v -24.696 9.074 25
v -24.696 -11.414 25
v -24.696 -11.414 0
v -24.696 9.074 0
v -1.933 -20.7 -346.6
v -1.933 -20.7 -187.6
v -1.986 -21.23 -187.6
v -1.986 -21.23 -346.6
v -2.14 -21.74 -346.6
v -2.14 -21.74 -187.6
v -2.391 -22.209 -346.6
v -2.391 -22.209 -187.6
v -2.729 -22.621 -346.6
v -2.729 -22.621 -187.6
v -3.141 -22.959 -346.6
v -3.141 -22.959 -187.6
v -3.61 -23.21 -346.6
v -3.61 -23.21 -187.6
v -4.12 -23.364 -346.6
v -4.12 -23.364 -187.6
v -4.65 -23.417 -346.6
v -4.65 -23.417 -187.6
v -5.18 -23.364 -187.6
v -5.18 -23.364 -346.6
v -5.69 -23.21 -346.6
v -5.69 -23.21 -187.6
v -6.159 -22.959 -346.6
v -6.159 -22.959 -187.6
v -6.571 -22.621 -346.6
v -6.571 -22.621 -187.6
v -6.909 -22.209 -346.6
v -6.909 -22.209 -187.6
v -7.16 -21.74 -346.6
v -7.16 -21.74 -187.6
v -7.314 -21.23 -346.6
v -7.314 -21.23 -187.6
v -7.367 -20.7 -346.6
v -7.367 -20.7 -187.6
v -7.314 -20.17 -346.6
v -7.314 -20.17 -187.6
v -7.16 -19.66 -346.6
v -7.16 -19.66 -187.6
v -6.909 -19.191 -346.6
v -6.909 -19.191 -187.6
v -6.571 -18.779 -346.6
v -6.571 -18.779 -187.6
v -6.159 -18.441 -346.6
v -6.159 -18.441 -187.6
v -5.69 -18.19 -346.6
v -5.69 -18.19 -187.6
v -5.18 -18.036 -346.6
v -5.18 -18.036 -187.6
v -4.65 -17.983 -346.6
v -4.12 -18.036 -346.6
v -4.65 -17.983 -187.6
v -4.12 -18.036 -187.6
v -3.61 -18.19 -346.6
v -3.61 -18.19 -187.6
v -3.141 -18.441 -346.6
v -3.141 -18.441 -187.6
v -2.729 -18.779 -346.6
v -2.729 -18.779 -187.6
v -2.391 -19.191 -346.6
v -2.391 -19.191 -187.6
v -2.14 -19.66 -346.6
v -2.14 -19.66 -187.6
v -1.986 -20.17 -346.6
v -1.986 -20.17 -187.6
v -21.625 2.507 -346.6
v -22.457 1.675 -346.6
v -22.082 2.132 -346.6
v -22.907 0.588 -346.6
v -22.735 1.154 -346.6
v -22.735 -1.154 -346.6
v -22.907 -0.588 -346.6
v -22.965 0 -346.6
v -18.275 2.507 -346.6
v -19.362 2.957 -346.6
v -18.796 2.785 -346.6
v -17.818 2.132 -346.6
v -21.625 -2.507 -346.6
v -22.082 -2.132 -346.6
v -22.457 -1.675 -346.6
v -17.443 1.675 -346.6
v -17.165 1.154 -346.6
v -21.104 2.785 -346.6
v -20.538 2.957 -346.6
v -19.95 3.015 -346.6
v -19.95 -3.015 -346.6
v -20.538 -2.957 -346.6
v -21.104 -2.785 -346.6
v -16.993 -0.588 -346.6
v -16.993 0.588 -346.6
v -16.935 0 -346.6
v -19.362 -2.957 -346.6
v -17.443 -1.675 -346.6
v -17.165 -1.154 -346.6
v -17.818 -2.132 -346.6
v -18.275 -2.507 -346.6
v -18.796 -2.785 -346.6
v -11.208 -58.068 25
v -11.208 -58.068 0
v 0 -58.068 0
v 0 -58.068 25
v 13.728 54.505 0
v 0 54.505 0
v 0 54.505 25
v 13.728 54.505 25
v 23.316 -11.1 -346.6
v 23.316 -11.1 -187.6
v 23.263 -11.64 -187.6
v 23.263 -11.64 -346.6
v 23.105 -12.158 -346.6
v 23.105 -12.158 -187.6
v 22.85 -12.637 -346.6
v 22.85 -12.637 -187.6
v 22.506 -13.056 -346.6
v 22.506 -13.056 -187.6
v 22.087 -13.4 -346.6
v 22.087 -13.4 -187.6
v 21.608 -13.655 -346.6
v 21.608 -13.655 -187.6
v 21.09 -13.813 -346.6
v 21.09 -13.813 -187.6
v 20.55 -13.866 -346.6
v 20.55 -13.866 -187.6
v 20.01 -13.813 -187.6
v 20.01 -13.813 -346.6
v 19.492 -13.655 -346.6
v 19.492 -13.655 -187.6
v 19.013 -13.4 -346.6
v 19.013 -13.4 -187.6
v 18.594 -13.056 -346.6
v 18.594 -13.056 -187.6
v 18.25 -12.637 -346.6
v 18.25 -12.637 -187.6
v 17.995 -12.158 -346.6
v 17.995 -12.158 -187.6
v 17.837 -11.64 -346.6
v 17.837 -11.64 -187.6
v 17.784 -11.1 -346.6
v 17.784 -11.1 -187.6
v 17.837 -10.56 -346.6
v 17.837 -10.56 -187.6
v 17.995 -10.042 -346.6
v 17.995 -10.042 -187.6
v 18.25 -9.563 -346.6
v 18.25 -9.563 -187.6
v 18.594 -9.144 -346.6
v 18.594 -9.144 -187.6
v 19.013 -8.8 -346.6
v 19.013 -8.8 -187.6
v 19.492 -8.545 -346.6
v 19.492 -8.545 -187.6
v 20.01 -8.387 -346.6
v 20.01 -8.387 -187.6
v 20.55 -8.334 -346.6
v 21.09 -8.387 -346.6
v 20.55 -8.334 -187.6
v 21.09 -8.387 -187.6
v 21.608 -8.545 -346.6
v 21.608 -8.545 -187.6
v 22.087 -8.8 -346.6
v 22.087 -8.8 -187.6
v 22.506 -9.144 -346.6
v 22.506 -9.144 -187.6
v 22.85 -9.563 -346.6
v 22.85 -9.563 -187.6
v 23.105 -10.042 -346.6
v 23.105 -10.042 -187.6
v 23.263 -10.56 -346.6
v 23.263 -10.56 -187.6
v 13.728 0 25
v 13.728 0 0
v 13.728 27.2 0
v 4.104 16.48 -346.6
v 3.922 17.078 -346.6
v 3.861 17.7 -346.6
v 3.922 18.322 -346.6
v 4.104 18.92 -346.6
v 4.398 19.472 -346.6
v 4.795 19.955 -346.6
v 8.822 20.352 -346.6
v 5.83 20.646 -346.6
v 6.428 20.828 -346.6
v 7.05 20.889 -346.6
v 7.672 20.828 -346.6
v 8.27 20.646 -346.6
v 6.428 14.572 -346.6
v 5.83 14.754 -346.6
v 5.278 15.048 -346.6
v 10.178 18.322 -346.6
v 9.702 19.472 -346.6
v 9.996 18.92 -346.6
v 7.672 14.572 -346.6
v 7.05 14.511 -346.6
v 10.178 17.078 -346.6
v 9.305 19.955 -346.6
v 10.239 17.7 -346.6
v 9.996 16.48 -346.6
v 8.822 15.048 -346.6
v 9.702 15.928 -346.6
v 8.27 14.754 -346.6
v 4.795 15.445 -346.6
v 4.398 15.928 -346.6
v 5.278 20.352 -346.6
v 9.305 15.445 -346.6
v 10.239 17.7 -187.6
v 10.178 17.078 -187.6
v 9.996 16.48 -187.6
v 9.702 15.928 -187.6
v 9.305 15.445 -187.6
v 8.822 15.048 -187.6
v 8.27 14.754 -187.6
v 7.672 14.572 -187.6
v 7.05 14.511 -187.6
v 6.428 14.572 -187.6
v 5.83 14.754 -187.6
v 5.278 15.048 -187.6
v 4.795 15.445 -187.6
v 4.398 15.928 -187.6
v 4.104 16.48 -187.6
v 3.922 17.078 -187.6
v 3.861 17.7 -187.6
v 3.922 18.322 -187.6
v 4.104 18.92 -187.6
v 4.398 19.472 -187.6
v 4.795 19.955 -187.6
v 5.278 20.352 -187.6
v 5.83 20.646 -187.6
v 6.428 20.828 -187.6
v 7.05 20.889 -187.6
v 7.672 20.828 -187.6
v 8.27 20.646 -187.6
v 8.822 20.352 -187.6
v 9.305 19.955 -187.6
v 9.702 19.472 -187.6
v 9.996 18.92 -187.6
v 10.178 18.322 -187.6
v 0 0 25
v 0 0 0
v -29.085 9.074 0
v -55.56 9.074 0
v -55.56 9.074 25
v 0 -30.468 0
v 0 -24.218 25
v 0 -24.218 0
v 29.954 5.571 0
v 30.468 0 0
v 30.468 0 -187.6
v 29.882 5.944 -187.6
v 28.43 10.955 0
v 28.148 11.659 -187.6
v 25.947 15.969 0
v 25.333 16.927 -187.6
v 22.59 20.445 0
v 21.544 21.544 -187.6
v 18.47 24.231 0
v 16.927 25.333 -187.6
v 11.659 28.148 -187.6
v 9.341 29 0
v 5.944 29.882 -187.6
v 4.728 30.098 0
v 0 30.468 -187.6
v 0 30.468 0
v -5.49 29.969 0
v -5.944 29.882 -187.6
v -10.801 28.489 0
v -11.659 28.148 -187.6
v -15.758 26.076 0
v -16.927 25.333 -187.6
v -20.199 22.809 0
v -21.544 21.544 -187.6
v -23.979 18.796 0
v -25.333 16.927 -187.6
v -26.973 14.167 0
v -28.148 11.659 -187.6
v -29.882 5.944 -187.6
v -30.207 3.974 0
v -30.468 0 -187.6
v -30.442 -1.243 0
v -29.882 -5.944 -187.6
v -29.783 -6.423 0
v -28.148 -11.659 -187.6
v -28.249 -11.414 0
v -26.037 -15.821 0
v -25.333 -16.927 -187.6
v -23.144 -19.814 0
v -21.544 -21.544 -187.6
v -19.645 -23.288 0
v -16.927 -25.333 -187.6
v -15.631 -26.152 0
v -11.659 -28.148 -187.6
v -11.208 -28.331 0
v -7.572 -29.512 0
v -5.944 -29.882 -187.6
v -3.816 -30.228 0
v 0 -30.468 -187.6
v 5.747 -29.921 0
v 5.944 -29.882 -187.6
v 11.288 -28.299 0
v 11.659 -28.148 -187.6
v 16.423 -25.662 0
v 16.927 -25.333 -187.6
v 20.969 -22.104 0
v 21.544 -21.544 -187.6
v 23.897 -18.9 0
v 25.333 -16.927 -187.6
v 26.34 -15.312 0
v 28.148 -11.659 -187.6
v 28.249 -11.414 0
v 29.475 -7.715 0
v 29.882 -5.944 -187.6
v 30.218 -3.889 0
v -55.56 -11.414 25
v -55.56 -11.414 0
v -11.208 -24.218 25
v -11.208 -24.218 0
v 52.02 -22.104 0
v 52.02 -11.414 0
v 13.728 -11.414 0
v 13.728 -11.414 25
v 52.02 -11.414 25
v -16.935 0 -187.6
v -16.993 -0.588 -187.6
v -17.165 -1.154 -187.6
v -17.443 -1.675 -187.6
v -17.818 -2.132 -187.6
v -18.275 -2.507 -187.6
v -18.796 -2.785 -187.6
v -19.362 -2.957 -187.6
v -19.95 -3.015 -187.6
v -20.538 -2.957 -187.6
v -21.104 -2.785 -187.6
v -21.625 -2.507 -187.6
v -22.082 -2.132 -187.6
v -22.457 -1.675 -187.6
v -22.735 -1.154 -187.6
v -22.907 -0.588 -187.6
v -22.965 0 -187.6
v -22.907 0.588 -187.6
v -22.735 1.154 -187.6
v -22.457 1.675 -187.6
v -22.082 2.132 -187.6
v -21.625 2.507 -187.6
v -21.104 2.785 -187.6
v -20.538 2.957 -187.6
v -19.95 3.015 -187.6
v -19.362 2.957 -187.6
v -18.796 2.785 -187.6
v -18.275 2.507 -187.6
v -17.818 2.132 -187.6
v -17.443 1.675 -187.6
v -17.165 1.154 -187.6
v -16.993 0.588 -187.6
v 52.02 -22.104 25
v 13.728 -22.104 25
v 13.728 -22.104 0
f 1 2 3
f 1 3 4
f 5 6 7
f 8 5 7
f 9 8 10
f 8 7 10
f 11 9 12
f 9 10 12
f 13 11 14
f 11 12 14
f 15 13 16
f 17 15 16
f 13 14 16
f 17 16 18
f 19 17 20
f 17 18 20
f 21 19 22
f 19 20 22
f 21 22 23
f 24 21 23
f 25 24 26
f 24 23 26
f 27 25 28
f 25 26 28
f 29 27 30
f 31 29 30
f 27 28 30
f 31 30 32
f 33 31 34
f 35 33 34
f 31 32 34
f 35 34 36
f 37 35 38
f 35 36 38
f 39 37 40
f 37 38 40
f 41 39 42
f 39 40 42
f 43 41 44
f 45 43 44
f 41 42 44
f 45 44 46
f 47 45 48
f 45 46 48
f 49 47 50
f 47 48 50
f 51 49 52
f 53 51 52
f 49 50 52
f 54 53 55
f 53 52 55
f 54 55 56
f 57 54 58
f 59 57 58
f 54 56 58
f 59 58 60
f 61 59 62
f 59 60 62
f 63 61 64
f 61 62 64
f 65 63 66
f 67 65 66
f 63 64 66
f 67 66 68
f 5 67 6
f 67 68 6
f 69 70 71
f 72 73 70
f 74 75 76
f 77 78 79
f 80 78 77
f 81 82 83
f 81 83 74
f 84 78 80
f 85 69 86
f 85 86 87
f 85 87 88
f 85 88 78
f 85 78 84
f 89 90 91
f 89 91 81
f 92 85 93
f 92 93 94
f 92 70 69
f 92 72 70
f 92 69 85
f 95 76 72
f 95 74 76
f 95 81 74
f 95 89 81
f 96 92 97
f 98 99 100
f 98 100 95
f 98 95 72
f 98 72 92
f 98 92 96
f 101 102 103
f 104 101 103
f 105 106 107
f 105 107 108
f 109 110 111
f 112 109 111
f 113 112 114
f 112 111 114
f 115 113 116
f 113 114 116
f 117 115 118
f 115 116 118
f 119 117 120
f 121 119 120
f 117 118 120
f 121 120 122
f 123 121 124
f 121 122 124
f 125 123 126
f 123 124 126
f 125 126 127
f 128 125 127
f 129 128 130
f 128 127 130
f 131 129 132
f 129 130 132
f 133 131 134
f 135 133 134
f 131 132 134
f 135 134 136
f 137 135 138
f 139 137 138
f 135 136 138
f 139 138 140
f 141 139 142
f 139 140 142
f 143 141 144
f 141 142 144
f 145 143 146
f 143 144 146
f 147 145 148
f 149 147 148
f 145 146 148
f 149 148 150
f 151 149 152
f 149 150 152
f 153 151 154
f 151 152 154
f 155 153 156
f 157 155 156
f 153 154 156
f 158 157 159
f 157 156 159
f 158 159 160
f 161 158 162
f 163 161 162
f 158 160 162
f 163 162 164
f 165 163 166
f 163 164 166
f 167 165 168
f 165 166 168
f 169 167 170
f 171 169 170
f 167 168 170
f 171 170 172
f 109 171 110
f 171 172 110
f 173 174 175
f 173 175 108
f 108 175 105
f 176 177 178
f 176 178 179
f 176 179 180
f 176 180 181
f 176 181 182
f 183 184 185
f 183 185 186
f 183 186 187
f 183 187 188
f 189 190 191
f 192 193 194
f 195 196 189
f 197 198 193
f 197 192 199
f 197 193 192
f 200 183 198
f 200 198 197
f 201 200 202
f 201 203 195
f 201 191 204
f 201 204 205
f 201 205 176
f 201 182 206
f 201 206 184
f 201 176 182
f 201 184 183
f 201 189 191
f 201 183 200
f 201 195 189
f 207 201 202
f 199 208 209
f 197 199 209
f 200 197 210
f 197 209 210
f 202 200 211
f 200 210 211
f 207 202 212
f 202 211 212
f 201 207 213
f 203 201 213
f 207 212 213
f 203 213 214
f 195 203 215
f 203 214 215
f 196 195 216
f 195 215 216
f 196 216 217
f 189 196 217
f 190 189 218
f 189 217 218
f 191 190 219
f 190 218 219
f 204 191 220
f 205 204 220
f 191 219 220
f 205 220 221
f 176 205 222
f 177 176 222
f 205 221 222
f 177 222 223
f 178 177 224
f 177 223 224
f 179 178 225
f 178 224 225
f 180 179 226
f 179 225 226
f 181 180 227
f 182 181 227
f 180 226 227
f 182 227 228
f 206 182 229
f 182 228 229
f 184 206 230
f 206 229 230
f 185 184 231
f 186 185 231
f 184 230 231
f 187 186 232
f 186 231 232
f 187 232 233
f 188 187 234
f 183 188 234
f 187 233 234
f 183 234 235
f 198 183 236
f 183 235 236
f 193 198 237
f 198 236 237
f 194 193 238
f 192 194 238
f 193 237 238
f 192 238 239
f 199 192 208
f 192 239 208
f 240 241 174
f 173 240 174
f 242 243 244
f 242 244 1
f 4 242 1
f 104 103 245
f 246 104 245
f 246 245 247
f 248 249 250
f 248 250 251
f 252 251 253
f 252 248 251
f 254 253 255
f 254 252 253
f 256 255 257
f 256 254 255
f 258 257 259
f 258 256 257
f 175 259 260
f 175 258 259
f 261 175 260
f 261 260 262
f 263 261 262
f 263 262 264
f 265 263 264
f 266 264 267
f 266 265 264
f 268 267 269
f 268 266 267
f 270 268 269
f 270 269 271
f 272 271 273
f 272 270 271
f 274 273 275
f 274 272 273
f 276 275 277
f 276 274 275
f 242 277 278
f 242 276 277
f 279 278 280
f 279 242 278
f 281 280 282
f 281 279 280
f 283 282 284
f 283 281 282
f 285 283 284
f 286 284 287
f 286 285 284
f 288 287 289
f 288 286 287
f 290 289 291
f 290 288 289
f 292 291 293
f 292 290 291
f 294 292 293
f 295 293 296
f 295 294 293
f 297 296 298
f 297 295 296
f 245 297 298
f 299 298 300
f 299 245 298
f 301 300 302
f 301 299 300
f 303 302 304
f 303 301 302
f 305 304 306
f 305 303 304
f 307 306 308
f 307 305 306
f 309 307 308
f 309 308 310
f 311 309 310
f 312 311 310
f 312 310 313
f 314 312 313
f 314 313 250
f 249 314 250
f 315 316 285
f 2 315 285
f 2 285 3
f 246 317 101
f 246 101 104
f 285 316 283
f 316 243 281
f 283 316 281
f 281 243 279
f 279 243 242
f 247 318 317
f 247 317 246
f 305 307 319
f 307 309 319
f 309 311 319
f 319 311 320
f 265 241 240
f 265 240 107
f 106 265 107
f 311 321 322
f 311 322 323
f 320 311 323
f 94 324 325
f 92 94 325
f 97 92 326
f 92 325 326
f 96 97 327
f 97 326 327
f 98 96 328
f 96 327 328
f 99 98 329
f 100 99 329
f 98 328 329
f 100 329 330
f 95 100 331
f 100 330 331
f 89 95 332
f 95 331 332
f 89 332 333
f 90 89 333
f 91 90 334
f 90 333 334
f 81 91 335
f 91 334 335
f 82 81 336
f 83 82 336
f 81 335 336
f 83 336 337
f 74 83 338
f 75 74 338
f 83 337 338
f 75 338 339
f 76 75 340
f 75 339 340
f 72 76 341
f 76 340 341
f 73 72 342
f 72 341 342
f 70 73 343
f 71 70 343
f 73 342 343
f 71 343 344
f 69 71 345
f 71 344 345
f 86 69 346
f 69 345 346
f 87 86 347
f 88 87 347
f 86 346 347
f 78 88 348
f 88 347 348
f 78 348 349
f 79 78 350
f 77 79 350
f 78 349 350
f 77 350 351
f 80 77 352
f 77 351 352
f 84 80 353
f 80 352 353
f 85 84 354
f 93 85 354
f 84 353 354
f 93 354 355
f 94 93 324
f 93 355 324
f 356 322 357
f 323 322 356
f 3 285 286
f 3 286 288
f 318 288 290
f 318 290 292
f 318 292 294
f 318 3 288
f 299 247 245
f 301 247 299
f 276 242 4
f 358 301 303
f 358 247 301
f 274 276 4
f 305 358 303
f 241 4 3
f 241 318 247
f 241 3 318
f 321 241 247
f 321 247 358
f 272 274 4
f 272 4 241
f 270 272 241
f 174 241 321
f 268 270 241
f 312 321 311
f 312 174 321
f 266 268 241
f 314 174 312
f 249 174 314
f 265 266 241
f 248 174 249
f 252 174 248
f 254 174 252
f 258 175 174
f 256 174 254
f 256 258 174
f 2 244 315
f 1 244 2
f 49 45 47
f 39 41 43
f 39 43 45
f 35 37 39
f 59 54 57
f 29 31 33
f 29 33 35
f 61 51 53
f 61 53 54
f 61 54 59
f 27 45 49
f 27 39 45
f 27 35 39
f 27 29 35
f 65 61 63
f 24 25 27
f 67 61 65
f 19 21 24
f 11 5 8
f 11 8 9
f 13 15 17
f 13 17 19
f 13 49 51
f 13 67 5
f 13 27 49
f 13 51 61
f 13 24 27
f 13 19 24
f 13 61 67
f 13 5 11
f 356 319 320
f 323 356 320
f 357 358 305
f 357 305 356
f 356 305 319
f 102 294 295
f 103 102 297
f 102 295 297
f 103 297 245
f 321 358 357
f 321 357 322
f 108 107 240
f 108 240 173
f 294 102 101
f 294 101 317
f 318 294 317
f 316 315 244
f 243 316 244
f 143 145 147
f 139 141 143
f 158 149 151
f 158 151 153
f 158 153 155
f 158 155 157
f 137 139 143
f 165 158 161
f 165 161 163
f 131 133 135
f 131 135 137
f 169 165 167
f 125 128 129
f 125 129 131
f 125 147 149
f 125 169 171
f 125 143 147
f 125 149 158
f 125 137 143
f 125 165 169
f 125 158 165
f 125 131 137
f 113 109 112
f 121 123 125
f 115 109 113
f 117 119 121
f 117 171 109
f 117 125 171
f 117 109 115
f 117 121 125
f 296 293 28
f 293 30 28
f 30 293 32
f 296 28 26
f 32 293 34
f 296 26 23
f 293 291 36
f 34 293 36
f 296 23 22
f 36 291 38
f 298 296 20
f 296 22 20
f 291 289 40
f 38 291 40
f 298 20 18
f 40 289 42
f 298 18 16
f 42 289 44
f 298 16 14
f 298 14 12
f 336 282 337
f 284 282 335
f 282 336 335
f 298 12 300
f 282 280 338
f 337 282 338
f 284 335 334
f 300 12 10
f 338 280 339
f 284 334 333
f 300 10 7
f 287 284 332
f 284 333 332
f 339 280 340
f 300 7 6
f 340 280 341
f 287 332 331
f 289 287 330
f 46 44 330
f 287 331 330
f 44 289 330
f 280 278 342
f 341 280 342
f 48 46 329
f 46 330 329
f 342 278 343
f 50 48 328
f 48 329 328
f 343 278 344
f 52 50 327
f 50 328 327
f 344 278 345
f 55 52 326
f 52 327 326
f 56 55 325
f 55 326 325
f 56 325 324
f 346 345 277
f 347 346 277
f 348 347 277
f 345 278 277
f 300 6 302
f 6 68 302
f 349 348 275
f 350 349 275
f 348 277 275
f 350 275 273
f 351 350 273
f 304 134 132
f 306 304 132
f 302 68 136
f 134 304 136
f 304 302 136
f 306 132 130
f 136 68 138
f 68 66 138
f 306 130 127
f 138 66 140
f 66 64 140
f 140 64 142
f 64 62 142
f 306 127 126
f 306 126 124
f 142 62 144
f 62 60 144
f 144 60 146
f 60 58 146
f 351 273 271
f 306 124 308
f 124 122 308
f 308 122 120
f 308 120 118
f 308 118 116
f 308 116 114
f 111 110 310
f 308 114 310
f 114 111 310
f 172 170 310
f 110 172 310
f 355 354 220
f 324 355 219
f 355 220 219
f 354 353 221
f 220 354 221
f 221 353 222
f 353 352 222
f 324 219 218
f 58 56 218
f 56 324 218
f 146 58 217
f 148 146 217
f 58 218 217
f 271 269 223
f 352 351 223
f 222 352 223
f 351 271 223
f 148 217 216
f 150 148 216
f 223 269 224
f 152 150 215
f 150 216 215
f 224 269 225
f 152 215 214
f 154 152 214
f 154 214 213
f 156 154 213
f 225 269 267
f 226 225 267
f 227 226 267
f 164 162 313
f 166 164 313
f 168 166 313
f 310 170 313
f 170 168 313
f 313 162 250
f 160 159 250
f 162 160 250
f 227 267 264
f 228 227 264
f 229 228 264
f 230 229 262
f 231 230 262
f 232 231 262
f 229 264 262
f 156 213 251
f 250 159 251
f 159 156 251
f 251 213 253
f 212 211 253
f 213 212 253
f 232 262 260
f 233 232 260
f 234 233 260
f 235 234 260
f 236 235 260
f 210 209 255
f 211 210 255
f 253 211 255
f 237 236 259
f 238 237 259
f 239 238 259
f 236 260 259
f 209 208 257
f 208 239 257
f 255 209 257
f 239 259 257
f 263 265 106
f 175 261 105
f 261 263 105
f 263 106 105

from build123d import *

# Parameters (mm, degrees)
F0_R     = 30.467504
F1_DEPTH = 187.6
F2_W     = 13.727636
F2_H     = 54.504935
F2_W_2   = 30.864643
F2_H_2   = 20.4884
F2_W_3   = 38.292515
F2_H_3   = 10.689599
F2_W_4   = 11.208073
F2_H_4   = 33.850385
F3_DEPTH = 25
F4_R     = 2.716617
F4_R_2   = 2.765864
F4_R_3   = 3.189043
F4_R_4   = 3.014963
F5_DEPTH = 159


with BuildPart() as f1:
    # F0 (on Top) → F1 (new body)
    with BuildSketch(Plane.XY):
        Circle(F0_R)
    extrude(amount=-F1_DEPTH)

    # F2 (on Top) → F3 (join)
    with BuildSketch(Plane.XY):
        with Locations((6.863818, 27.252467)):
            Rectangle(F2_W, F2_H)
        with Locations((-40.128017, -1.170069)):
            Rectangle(F2_W_2, F2_H_2)
        with Locations((32.873894, -16.759068)):
            Rectangle(F2_W_3, F2_H_3)
        with Locations((-5.604036, -41.142927)):
            Rectangle(F2_W_4, F2_H_4)
    extrude(amount=F3_DEPTH)

    # F4 (on face) → F5 (join)
    with BuildSketch(Plane(origin=(0, 0, -187.6), x_dir=(1, 0, 0), z_dir=(0, 0, -1))):
        with Locations((-4.650002, 20.7)):
            Circle(F4_R)
        with Locations((20.55, 11.100001)):
            Circle(F4_R_2)
        with Locations((7.050002, -17.7)):
            Circle(F4_R_3)
        with Locations((-19.950002, 0)):
            Circle(F4_R_4)
    extrude(amount=F5_DEPTH)


solid = f1.part
